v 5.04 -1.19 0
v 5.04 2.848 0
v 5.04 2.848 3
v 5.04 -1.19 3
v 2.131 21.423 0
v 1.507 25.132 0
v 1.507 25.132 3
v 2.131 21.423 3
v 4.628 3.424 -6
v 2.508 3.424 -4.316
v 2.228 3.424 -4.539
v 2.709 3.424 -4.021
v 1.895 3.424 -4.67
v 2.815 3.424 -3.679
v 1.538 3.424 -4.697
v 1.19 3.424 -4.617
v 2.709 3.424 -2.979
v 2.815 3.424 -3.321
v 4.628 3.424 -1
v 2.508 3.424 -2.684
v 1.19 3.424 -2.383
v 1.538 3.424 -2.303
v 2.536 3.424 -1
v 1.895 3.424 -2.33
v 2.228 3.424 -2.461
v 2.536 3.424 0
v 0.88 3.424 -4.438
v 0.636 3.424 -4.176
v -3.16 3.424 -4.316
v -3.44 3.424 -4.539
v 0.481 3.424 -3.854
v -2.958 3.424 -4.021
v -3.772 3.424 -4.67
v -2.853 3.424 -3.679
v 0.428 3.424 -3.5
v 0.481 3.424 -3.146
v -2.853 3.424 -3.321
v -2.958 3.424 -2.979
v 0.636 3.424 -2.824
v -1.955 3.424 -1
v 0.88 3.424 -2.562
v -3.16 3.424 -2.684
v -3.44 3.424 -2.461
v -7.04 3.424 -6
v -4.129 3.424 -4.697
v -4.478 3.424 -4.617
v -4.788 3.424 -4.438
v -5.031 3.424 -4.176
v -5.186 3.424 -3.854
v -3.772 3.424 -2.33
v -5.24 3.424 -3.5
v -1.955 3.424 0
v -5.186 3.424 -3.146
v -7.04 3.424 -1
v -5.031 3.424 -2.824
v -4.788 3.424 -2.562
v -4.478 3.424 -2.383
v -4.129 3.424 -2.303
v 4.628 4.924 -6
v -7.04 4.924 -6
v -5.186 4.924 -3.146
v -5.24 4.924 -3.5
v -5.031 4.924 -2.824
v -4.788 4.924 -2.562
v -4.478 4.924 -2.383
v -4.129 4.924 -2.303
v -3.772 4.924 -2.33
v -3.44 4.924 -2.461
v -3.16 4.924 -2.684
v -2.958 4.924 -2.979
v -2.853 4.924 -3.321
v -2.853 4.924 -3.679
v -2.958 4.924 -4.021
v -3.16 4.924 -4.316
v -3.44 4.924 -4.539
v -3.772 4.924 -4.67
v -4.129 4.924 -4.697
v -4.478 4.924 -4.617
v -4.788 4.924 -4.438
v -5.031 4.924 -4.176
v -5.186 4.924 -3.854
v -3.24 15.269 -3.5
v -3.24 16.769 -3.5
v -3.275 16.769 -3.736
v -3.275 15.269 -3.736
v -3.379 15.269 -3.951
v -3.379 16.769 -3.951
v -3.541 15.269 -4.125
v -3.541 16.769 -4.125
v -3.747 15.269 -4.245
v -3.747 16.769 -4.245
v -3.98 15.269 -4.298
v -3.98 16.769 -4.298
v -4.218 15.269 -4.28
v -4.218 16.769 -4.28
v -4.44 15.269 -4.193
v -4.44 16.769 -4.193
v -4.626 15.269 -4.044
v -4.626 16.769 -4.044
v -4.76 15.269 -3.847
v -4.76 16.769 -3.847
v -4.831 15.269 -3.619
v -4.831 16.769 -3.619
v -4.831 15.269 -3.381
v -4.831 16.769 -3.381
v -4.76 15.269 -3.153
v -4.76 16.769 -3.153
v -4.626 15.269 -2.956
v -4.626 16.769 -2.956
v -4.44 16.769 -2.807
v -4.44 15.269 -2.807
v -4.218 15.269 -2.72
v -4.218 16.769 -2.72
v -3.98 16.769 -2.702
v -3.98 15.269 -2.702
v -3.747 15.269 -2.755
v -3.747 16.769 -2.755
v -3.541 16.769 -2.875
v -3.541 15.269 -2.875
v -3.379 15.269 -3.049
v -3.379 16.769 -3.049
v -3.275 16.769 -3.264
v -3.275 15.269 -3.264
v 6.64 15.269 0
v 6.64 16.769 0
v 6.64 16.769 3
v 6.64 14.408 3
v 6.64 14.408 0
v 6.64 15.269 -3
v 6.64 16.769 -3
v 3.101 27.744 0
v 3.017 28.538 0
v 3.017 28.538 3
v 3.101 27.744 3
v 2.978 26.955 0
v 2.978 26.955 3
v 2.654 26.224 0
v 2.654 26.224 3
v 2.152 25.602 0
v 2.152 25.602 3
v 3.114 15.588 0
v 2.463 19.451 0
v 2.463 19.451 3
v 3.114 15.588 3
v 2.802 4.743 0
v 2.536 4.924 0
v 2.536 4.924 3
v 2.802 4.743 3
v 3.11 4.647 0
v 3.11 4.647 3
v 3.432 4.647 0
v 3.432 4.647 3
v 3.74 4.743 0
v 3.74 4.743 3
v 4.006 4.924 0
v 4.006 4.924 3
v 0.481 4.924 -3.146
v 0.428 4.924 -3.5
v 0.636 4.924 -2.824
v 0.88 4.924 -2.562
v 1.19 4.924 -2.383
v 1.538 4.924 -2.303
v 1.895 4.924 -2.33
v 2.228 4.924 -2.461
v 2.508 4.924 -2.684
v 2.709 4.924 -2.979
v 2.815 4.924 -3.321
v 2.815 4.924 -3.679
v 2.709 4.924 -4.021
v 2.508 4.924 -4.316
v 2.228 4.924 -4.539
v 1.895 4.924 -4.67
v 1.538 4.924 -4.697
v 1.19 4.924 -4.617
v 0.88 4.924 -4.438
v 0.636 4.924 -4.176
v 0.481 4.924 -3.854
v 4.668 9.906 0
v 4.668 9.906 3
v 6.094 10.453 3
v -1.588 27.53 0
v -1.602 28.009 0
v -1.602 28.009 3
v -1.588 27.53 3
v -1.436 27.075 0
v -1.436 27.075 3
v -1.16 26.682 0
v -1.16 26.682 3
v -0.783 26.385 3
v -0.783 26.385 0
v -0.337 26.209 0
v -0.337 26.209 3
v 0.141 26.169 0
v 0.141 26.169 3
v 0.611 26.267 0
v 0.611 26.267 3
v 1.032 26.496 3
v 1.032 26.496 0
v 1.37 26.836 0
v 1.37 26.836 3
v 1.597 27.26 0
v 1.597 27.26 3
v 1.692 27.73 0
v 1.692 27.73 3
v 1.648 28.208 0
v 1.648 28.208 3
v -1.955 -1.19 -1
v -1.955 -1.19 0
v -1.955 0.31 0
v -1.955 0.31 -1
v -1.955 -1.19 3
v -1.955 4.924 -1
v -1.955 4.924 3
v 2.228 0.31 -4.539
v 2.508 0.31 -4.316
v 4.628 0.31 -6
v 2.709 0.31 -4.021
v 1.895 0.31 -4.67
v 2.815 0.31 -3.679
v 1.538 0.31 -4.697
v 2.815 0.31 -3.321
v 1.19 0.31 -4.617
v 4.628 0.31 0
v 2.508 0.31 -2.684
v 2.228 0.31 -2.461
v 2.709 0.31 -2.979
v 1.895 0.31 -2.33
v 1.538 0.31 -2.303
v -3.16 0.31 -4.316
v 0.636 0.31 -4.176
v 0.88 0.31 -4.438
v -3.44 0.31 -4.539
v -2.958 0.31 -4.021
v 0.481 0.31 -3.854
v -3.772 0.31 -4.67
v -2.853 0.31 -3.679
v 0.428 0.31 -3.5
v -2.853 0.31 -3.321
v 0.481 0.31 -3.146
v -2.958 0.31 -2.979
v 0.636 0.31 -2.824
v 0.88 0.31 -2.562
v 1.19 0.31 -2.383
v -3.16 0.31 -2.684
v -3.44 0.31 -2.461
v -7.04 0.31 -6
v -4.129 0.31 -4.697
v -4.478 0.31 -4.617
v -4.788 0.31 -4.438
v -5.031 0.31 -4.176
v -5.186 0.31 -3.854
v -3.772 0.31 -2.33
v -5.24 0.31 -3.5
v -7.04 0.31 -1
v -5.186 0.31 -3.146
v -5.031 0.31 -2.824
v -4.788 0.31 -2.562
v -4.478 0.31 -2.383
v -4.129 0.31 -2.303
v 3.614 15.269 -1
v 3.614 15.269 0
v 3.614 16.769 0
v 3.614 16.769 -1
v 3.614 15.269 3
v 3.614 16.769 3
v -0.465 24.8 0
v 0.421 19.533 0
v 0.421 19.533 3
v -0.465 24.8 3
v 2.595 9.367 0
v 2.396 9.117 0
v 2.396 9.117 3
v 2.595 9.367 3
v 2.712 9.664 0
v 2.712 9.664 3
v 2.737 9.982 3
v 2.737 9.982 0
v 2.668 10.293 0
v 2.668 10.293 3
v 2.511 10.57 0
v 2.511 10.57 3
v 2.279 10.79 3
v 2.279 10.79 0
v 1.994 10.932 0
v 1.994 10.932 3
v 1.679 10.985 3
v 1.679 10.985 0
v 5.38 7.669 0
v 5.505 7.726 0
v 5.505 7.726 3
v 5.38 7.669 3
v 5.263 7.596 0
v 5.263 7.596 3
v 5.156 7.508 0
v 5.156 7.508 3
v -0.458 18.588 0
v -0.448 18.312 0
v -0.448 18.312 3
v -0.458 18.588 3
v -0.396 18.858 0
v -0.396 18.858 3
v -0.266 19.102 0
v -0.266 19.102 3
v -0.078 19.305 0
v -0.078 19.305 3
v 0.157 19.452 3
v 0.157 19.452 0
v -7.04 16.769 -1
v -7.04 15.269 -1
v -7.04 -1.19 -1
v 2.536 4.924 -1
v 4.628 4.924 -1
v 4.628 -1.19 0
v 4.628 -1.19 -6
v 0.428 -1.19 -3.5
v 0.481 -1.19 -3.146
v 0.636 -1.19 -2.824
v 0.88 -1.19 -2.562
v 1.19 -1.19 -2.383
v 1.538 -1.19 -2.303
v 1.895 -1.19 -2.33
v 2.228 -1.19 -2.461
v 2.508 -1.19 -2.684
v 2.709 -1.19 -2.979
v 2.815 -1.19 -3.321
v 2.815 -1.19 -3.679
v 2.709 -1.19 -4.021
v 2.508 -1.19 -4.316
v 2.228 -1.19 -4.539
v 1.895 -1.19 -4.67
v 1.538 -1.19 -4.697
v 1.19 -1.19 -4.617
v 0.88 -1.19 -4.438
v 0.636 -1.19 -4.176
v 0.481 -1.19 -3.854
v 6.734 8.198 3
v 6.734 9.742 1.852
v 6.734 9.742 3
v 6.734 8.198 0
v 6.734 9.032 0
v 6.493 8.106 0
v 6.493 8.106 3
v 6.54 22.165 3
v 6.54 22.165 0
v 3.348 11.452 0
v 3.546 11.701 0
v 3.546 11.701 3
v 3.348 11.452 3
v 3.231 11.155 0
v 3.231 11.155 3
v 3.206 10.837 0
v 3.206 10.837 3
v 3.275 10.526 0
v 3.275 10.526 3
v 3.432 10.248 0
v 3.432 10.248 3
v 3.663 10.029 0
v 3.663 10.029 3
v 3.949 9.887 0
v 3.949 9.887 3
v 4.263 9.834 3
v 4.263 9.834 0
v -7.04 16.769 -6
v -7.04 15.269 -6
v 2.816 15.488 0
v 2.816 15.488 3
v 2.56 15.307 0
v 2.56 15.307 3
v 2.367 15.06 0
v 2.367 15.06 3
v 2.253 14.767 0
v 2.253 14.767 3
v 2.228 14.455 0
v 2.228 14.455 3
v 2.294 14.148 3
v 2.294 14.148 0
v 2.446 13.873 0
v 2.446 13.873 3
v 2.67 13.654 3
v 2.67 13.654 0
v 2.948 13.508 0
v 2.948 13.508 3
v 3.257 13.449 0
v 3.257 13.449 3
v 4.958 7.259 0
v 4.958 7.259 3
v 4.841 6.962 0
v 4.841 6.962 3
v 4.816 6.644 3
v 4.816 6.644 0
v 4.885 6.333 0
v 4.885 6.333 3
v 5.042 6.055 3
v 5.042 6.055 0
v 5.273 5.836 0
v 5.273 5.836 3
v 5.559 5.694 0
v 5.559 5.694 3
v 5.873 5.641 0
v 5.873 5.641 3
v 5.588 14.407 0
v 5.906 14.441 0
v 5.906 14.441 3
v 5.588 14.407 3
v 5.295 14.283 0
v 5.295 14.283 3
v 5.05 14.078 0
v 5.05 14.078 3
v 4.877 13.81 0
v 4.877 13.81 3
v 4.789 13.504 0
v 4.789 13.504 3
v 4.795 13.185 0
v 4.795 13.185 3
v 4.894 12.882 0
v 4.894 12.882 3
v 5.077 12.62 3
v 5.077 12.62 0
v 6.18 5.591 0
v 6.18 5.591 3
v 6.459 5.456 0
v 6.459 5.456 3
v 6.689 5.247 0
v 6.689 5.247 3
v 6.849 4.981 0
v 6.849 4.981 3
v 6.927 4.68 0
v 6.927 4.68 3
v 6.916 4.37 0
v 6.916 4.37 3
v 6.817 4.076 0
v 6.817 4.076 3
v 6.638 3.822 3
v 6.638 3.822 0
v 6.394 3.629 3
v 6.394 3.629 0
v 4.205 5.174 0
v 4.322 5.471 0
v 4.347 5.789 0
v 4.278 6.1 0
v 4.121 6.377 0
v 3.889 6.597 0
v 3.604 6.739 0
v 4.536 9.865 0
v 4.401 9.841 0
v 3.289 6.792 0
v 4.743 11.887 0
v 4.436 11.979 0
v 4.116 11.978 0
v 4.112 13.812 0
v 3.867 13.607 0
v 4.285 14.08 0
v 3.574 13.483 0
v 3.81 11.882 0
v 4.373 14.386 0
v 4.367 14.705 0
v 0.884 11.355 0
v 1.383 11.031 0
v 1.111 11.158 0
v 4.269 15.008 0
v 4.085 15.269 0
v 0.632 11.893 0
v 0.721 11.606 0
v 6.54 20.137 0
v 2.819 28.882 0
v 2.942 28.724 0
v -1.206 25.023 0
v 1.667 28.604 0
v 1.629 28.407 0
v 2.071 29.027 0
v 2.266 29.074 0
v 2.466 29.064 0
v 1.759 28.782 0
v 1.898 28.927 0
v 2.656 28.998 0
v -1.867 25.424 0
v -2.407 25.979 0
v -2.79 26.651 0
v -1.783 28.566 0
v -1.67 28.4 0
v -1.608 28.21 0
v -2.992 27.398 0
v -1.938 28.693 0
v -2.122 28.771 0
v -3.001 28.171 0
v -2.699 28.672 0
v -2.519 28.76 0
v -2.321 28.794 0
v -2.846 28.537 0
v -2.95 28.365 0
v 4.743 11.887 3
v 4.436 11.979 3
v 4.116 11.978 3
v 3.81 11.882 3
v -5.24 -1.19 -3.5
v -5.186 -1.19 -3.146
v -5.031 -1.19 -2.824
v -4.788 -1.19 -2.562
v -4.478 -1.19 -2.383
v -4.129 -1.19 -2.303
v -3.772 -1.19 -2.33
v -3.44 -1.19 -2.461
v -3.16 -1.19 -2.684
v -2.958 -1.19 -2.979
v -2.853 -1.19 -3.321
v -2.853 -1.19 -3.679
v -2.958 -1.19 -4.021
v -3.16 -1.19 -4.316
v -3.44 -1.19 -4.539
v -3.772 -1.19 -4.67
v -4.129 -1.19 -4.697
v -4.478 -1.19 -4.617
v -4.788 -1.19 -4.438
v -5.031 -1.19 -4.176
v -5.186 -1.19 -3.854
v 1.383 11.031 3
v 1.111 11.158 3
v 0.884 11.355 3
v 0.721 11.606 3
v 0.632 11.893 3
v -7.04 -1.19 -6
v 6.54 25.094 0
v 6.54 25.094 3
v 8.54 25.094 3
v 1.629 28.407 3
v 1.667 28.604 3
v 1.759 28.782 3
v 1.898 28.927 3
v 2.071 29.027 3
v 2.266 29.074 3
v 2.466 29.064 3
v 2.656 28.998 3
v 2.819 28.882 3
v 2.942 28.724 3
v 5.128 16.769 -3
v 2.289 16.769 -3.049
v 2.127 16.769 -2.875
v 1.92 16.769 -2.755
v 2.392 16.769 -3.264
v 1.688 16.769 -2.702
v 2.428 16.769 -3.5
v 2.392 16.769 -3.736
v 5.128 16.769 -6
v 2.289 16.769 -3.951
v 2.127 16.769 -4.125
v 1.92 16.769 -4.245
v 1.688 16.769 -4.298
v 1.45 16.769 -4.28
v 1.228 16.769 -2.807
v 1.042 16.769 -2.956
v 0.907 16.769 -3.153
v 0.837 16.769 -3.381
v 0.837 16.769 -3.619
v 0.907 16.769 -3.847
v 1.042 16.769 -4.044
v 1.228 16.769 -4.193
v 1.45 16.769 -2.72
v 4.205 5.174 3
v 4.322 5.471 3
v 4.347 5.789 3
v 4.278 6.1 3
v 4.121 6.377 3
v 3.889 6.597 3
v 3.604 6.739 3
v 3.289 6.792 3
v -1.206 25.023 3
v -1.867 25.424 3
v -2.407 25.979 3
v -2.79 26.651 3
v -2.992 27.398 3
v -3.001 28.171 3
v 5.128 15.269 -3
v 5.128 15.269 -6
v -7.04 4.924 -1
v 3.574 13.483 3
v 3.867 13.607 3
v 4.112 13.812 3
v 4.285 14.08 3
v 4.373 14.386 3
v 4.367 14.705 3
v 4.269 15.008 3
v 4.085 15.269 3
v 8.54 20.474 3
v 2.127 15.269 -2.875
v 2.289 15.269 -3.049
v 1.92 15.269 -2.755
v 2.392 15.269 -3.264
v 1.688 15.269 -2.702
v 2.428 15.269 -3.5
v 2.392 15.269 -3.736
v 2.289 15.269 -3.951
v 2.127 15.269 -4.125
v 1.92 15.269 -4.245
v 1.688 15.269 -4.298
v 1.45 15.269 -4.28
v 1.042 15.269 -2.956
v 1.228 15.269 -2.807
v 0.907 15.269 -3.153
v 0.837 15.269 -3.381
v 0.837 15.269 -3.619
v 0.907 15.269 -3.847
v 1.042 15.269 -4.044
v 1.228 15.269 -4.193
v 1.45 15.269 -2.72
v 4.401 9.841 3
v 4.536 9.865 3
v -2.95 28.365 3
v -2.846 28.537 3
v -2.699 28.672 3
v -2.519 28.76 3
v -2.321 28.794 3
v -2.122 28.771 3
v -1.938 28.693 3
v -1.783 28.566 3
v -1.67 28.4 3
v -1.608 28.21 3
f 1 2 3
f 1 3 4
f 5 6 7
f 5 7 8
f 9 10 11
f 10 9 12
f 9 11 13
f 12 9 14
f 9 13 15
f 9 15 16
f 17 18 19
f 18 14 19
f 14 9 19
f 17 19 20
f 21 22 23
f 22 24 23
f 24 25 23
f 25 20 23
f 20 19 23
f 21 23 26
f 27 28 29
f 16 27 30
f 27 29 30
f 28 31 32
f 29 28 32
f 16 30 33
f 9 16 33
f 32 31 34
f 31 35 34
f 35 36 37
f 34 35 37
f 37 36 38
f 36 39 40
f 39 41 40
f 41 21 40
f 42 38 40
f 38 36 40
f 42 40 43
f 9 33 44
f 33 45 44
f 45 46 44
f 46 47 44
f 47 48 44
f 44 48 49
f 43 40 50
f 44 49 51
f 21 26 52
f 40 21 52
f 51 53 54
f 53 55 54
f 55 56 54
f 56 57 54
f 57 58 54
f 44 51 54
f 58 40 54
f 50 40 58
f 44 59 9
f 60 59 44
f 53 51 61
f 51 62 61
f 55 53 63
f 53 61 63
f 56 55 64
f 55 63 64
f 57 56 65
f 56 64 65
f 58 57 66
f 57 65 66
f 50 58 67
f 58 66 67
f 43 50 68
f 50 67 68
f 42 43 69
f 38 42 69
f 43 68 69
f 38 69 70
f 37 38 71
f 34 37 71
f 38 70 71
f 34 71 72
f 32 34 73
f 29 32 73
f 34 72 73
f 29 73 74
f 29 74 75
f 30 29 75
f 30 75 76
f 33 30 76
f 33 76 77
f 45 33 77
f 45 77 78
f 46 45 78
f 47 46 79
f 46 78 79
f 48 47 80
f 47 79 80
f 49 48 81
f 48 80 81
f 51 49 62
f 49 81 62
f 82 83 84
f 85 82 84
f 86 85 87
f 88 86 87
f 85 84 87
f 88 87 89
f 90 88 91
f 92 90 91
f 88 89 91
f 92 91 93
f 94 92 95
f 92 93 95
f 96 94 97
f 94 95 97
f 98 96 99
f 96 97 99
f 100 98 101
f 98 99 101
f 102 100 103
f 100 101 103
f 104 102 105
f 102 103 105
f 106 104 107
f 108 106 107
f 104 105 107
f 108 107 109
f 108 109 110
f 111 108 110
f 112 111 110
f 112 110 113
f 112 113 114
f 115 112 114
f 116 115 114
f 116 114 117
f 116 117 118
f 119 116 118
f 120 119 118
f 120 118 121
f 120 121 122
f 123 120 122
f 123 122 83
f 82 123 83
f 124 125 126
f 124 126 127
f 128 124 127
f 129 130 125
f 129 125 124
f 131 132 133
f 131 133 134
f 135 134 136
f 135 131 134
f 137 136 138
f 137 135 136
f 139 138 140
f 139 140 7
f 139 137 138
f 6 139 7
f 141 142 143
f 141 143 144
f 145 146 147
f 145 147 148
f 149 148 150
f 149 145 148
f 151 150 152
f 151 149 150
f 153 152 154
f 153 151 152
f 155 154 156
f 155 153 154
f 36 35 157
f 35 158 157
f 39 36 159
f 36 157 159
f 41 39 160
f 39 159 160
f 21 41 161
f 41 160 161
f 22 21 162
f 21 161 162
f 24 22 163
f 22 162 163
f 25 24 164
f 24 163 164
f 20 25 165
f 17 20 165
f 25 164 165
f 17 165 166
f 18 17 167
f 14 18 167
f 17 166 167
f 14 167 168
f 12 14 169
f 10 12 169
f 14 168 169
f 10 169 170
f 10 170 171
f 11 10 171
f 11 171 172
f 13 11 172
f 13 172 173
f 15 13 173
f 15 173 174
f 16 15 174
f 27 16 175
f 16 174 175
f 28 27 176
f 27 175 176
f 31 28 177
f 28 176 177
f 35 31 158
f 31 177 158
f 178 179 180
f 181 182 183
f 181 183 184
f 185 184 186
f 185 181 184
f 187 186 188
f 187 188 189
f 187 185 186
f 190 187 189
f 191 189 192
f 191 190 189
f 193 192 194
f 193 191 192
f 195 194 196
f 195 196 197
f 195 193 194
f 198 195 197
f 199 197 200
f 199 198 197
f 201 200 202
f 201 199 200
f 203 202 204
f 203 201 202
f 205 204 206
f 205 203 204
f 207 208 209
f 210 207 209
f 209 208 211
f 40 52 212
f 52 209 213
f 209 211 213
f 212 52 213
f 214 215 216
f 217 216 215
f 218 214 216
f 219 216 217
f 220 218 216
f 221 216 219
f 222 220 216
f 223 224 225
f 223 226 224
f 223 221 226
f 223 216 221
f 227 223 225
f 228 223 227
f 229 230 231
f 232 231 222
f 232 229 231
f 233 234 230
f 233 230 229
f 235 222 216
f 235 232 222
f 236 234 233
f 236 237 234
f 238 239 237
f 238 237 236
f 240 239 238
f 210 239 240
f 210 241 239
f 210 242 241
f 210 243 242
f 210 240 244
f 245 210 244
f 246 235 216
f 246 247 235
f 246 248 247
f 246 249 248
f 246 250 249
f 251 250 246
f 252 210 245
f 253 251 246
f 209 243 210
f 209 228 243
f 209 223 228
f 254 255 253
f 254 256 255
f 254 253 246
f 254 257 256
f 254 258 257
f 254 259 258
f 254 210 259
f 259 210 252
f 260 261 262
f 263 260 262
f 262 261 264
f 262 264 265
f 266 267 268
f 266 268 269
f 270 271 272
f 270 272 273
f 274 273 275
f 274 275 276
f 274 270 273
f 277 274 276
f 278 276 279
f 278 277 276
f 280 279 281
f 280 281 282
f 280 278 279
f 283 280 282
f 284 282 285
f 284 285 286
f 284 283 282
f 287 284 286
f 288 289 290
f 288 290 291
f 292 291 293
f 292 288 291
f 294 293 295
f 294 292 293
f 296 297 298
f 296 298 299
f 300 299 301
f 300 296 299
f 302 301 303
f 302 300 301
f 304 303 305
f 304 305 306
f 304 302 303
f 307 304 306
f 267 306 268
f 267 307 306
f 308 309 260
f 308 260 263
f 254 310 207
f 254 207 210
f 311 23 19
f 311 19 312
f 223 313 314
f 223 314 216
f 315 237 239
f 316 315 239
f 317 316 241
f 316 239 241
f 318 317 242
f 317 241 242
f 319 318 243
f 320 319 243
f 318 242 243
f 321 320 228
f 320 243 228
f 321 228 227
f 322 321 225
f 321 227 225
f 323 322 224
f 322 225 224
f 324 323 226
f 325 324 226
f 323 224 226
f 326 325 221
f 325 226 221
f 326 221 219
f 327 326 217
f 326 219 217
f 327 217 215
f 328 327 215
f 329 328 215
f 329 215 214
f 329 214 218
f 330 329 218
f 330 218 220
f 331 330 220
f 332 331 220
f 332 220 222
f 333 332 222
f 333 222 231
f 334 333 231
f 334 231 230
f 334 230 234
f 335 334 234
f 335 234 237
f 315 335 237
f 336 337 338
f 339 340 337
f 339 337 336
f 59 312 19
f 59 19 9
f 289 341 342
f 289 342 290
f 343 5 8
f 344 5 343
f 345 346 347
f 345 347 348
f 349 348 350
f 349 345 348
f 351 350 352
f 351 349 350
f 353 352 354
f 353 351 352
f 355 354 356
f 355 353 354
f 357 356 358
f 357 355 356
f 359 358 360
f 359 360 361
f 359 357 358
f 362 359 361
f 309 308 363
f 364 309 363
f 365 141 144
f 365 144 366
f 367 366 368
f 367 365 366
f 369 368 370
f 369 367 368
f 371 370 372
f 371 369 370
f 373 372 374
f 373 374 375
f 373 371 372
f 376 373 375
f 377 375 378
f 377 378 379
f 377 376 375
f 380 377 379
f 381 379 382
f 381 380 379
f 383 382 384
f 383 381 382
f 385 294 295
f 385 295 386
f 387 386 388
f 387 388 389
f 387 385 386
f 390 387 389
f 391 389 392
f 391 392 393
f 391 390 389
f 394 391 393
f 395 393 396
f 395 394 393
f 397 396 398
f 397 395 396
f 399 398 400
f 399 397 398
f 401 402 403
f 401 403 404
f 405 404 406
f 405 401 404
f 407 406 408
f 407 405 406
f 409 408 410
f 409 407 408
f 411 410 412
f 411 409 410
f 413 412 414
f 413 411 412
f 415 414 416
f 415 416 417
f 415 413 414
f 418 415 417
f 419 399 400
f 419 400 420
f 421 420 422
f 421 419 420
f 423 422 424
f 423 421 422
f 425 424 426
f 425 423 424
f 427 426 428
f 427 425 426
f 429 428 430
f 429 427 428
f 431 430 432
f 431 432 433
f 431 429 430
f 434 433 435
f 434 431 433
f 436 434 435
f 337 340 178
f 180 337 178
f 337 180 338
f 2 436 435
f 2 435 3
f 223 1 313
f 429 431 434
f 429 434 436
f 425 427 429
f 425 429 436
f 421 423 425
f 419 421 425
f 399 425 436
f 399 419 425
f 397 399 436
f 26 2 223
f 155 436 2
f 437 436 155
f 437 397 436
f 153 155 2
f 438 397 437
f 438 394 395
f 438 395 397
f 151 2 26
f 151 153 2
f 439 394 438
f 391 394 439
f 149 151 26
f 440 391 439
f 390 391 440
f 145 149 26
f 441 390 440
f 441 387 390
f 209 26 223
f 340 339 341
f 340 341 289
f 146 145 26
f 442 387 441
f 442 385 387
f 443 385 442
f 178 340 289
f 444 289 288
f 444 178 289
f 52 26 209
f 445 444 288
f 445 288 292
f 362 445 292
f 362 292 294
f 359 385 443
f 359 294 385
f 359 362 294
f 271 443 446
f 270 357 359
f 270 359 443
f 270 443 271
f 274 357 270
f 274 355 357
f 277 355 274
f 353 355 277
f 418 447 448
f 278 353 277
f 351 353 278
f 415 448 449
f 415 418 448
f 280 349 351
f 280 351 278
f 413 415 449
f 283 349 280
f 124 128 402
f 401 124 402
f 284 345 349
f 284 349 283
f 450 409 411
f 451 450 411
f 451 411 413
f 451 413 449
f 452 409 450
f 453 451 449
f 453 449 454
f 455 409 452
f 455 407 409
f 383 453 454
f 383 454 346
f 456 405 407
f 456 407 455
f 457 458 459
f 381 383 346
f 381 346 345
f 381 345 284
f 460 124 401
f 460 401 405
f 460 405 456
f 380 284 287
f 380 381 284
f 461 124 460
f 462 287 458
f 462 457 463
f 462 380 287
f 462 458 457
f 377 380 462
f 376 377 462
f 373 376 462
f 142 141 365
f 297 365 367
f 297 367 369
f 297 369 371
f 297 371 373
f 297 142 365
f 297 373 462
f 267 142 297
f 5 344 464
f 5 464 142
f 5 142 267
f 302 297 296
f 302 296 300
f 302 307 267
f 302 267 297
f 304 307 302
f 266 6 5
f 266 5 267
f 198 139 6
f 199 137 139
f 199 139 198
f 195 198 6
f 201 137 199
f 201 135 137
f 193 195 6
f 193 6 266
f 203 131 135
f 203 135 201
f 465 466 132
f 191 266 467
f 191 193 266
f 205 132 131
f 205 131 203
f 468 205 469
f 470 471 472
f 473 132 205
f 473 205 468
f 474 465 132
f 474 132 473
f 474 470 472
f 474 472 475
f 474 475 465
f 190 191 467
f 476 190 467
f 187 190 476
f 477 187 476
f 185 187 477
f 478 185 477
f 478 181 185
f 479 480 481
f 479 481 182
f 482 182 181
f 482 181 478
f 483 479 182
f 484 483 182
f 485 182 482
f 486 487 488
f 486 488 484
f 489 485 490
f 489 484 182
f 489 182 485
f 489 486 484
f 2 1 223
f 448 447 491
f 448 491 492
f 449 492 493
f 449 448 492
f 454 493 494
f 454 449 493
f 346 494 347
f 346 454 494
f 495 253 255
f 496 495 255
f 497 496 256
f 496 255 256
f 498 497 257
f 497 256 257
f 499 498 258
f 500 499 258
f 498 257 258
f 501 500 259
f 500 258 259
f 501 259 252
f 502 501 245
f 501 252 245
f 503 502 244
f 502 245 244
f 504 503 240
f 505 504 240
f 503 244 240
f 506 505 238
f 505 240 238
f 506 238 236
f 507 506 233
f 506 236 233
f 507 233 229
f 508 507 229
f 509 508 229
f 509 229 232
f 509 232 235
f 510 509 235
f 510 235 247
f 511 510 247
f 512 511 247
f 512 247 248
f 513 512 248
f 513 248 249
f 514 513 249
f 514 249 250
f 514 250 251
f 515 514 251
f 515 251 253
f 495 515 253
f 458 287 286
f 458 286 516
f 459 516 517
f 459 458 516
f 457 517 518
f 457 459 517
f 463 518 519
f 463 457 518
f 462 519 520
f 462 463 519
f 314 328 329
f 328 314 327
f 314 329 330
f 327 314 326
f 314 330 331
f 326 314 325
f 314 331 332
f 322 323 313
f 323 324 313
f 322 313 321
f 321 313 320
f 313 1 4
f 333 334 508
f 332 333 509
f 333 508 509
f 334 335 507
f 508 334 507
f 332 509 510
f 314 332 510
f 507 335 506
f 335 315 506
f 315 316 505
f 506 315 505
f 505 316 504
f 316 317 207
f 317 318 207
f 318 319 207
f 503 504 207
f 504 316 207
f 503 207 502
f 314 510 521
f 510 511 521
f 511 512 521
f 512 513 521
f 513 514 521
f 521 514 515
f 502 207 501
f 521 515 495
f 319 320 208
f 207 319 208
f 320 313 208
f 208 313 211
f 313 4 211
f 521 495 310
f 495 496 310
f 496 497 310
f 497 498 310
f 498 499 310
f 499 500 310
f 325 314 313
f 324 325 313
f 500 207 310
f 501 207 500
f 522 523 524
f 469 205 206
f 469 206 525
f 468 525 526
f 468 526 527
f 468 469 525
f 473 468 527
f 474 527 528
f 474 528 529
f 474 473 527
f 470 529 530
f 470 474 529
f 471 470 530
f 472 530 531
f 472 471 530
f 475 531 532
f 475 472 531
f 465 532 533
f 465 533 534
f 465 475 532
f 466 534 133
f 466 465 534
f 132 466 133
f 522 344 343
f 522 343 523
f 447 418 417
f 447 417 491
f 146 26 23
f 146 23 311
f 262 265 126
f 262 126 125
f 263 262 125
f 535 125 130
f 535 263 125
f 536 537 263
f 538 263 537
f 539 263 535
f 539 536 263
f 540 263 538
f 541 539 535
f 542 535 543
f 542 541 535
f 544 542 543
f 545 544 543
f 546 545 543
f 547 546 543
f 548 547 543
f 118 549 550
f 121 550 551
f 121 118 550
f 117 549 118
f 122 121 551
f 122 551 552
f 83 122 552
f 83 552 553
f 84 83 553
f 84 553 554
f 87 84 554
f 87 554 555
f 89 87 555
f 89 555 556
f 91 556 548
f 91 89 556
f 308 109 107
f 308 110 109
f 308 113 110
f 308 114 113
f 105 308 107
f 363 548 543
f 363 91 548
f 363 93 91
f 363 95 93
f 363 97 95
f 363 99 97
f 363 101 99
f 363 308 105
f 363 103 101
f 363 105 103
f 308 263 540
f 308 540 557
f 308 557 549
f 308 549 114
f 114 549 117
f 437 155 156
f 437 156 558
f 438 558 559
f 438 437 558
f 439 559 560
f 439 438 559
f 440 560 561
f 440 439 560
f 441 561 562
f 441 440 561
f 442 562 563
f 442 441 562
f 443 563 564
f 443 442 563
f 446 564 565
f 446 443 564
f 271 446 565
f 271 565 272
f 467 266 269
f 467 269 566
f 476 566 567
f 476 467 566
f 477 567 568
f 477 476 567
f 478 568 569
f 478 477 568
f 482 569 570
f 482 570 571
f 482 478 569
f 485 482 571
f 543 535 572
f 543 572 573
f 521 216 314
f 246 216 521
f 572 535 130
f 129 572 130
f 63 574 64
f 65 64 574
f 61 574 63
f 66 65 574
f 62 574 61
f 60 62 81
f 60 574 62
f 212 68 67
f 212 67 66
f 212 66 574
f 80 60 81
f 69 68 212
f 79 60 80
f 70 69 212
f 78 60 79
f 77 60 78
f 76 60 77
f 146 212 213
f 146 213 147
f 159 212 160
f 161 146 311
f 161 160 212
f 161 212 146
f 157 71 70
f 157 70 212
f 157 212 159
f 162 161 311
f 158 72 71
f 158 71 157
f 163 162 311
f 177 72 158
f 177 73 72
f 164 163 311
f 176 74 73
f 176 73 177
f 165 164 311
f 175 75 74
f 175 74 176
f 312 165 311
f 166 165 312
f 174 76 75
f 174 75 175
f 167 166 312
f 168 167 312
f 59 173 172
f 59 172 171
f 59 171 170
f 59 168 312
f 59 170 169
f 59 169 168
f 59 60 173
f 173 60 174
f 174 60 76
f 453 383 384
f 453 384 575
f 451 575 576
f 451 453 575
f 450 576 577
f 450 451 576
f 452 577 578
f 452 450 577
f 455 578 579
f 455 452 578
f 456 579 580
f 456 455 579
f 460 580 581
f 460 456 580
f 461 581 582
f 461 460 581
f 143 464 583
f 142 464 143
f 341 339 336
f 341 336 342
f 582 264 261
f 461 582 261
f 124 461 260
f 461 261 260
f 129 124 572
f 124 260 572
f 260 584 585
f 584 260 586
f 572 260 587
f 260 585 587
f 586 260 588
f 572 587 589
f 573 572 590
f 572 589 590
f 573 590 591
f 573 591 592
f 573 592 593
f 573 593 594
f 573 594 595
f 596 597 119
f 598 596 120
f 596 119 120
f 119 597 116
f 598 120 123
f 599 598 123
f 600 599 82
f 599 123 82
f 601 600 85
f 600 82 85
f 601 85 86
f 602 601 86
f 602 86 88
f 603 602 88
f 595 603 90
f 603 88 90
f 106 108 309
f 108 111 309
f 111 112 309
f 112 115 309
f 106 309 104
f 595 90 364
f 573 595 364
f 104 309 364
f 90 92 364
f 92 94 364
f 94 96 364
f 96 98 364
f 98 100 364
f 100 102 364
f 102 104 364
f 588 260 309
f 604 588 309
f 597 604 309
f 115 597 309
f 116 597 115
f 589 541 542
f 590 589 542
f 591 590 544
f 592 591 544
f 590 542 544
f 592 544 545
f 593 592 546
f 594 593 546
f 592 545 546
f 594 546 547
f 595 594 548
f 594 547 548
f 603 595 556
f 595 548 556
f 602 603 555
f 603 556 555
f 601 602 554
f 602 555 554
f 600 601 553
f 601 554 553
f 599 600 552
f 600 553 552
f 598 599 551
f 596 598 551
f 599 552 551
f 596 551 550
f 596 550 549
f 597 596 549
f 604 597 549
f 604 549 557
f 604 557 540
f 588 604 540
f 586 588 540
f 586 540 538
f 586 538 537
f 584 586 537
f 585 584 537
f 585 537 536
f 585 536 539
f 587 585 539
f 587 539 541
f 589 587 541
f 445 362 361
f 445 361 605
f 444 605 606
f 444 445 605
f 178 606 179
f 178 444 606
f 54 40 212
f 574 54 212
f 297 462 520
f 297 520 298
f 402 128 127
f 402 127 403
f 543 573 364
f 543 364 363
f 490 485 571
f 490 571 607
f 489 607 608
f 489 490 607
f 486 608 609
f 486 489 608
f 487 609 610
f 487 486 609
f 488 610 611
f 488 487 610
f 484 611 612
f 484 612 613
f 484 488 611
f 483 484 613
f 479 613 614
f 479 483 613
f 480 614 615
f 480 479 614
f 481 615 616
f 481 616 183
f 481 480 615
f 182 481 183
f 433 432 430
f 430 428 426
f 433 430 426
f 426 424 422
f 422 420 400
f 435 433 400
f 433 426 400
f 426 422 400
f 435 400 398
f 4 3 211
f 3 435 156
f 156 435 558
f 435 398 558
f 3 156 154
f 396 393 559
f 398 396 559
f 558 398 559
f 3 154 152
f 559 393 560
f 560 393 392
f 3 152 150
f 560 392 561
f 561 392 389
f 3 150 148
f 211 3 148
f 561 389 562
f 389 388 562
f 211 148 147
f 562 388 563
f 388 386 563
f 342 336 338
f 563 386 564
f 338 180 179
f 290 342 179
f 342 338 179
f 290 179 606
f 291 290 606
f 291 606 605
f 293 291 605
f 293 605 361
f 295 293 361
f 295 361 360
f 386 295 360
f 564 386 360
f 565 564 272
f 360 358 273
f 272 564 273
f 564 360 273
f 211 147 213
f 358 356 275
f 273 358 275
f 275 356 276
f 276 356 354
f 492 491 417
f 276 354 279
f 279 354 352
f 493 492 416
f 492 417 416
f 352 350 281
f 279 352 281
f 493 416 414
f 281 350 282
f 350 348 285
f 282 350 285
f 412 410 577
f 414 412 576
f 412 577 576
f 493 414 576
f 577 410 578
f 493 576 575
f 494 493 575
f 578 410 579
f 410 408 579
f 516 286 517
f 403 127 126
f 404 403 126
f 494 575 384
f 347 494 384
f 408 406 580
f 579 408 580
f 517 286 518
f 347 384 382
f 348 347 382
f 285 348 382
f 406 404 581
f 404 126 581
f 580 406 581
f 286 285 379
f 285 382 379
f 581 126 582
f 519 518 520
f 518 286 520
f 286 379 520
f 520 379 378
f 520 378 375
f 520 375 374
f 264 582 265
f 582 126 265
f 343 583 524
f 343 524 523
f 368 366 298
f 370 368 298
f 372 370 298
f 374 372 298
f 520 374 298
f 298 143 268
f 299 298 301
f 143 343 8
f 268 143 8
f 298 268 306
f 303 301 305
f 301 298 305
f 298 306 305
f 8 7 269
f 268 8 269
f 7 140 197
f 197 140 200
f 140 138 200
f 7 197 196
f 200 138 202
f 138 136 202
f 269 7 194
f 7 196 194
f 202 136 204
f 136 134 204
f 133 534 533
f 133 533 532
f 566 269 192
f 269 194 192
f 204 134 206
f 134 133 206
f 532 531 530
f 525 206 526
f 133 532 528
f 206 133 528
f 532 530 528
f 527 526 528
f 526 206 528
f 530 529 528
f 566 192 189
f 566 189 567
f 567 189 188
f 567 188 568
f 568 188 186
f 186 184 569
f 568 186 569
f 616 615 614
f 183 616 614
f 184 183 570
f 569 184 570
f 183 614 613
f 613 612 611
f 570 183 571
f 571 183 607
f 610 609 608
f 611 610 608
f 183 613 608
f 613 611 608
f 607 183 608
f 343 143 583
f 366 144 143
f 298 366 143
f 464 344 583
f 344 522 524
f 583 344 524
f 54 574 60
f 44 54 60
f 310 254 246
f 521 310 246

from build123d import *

# Parameters (mm, degrees)
BOSS_SWITCHMAIN_DEPTH           = 3
SKETCH1_W                       = 6.582729781
SKETCH1_H                       = 1.5
SKETCH1_W_2                     = 3.025930853
SKETCH1_W_3                     = 4.49100728
BOSS_FLANGE_WIDTH_DEPTH         = 6
SKETCH2_W                       = 5
SKETCH2_H                       = 1.5
BOSS_FLANGE_HEIGHT_DEPTH        = 11.6675
TAP_DRILL_FOR_M2X0_4_TAP1_D     = 1.6
M2_CLEARANCE_HOLE2_D            = 2.4
M2_CLEARANCE_HOLE2_DEPTH        = 6.113984988
M2_CLEARANCE_HOLE2_TIP          = 0.721032743
CUT_FLANGE_RAMP_CLEARANCE_REACH = 19.959
SKETCH10_W                      = 1.51157113
SKETCH10_H                      = 3
CUT_EXTRUDE1_REACH              = 28.283
CUT_EXTRUDE2_REACH              = 22.07


with BuildPart() as part:
    # Sketch-SwitchBossUp → Boss-SwitchMain (new body)
    with BuildSketch(Plane.XY):
        with BuildLine():
            Line((6.540476927, 22.165014537), (6.540476927, 25.093856925))
            Line((6.540476927, 25.093856925), (8.540476927, 25.093856925))
            Line((8.540476927, 25.093856925), (8.540476927, 20.473554675))
            Line((8.540476927, 20.473554675), (2.463355023, 19.450530066))
            Line((2.463355023, 19.450530066), (3.113617204, 15.587746603))
            ThreePointArc((3.113617204, 15.587746603), (2.228151344, 14.454516392), (3.25659329, 13.449246446))
            ThreePointArc((3.25659329, 13.449246446), (4.285298124, 14.079636296), (4.085366752, 15.269448233))
            Line((4.085366752, 15.269448233), (3.613617204, 15.269448233))
            Line((3.613617204, 15.269448233), (3.613617204, 16.769448233))
            Line((3.613617204, 16.769448233), (6.639548057, 16.769448233))
            Line((6.639548057, 16.769448233), (6.639548057, 14.40837951))
            Line((6.639548057, 14.40837951), (5.90556854, 14.440674771))
            ThreePointArc((5.90556854, 14.440674771), (4.876863705, 13.810284921), (5.076795077, 12.620472983))
            Line((5.076795077, 12.620472983), (4.742765687, 11.886857682))
            ThreePointArc((4.742765687, 11.886857682), (4.116092357, 11.977881728), (3.546393548, 11.701389219))
            ThreePointArc((3.546393548, 11.701389219), (3.274676841, 10.525891439), (4.263259905, 9.834278449))
            ThreePointArc((4.263259905, 9.834278449), (4.46894162, 9.850585257), (4.667751547, 9.905771245))
            Line((4.667751547, 9.905771245), (6.093996382, 10.453369682))
            Line((6.093996382, 10.453369682), (6.73413388, 9.742424966))
            Line((6.73413388, 9.742424966), (6.73413388, 8.198043394))
            Line((6.73413388, 8.198043394), (6.493366278, 8.105602069))
            Line((6.493366278, 8.105602069), (5.504663813, 7.725995489))
            ThreePointArc((5.504663813, 7.725995489), (5.320005472, 7.633951058), (5.156260325, 7.508418563))
            ThreePointArc((5.156260325, 7.508418563), (4.884543619, 6.332920783), (5.873126682, 5.641307794))
            ThreePointArc((5.873126682, 5.641307794), (6.898907846, 4.833576465), (6.394232666, 3.629433676))
            Line((6.394232666, 3.629433676), (5.040476927, 2.847842436))
            Line((5.040476927, 2.847842436), (5.040476927, -1.189543551))
            Line((5.040476927, -1.189543551), (-1.954752854, -1.189543551))
            Line((-1.954752854, -1.189543551), (-1.954752854, 4.924441437))
            Line((-1.954752854, 4.924441437), (2.536254426, 4.924441437))
            ThreePointArc((2.536254426, 4.924441437), (3.271135169, 4.635221221), (4.006015912, 4.924441437))
            ThreePointArc((4.006015912, 4.924441437), (4.277732619, 6.099939217), (3.289149555, 6.791552207))
            Line((3.289149555, 6.791552207), (2.396149135, 9.117412093))
            ThreePointArc((2.396149135, 9.117412093), (2.667865841, 10.292909873), (1.679282778, 10.984522862))
            ThreePointArc((1.679282778, 10.984522862), (0.990609652, 11.24824473), (0.632497087, 11.892896022))
            Line((0.632497087, 11.892896022), (-0.448028681, 18.3115948))
            ThreePointArc((-0.448028681, 18.3115948), (-0.266285833, 19.102309392), (0.421345416, 19.532917442))
            Line((0.421345416, 19.532917442), (-0.465233701, 24.799505683))
            ThreePointArc((-0.465233701, 24.799505683), (-2.406587703, 25.978955839), (-3.001107523, 28.171329943))
            ThreePointArc((-3.001107523, 28.171329943), (-2.220760115, 28.789797628), (-1.602292431, 28.009450221))
            ThreePointArc((-1.602292431, 28.009450221), (0.141134159, 26.168671513), (1.647974165, 28.207650602))
            ThreePointArc((1.647974165, 28.207650602), (2.167041147, 29.057364566), (3.016755111, 28.538297585))
            ThreePointArc((3.016755111, 28.538297585), (2.839798095, 26.578800421), (1.507016259, 25.131514861))
            Line((1.507016259, 25.131514861), (2.131345845, 21.422780026))
            Line((2.131345845, 21.422780026), (6.540476927, 22.165014537))
        make_face()
    extrude(amount=BOSS_SWITCHMAIN_DEPTH)

    # Sketch1 → Boss-Flange Width (add)
    with BuildSketch(Plane(origin=(0, 0, 0), x_dir=(-1, 0, 0), z_dir=(0, 0, -1))):
        with Locations((-1.336612037, -0.439543551)):
            Rectangle(SKETCH1_W, SKETCH1_H)
        with Locations((-5.126582631, 16.019448233)):
            Rectangle(SKETCH1_W_2, SKETCH1_H)
        with Locations((-0.290750786, 4.174441437)):
            Rectangle(SKETCH1_W_3, SKETCH1_H)
    extrude(amount=BOSS_FLANGE_WIDTH_DEPTH)

    # Sketch2 → Boss-Flange Height (add)
    with BuildSketch(Plane(origin=(-7.039523073, 0, 0), x_dir=(0, 0, -1), z_dir=(1, 0, 0))):
        with Locations((3.5, 16.019448233)):
            Rectangle(SKETCH2_W, SKETCH2_H)
        with Locations((3.5, 4.174441437)):
            Rectangle(SKETCH2_W, SKETCH2_H)
        with Locations((3.5, -0.439543551)):
            Rectangle(SKETCH2_W, SKETCH2_H)
    extrude(amount=BOSS_FLANGE_HEIGHT_DEPTH)

    # Tap Drill for M2x0.4 Tap1 (through all)
    with Locations(Plane(origin=(0, -1.189543551, 0), x_dir=(-1, 0, 0), z_dir=(0, -1, 0))):
        with Locations((4.039523073, 3.5), (-1.627976927, 3.5)):
            Hole(TAP_DRILL_FOR_M2X0_4_TAP1_D / 2)

    # M2 Clearance Hole2
    with Locations(Plane.XZ.offset(1.189543551)):
        with Locations((-4.039523073, -3.5), (1.627976927, -3.5)):
            Hole(M2_CLEARANCE_HOLE2_D / 2, depth=M2_CLEARANCE_HOLE2_DEPTH)
            with Locations((0, 0, -(M2_CLEARANCE_HOLE2_DEPTH + M2_CLEARANCE_HOLE2_TIP / 2))):  # 118° drill point
                Cone(0, M2_CLEARANCE_HOLE2_D / 2, M2_CLEARANCE_HOLE2_TIP, mode=Mode.SUBTRACT)

    # Sketch10 → Cut-Flange Ramp Clearance (cut, up to next)
    with BuildSketch(Plane(origin=(0, 16.769448233, 0), x_dir=(1, 0, 0), z_dir=(0, 1, 0)), mode=Mode.PRIVATE) as cut_flange_ramp_clearance_sk1:
        with Locations((5.883762492, 4.5)):
            Rectangle(SKETCH10_W, SKETCH10_H)
    cut_flange_ramp_clearance_tool1 = extrude(cut_flange_ramp_clearance_sk1.sketch, amount=-CUT_FLANGE_RAMP_CLEARANCE_REACH, mode=Mode.PRIVATE) & part.part
    add(cut_flange_ramp_clearance_tool1.solids().sort_by_distance((5.883762, 16.769448, -4.5))[0], mode=Mode.SUBTRACT)

    # Sketch12 → Cut-Extrude1 (cut, up to next)
    with BuildSketch(Plane(origin=(0, 25.093856925, 0), x_dir=(1, 0, 0), z_dir=(0, 1, 0)), mode=Mode.PRIVATE) as cut_extrude1_sk1:
        Polygon((6.540476927, 0), (8.540476927, -3), (8.540476927, 0), align=None)
    cut_extrude1_tool1 = extrude(cut_extrude1_sk1.sketch, amount=-CUT_EXTRUDE1_REACH, mode=Mode.PRIVATE) & part.part
    add(cut_extrude1_tool1.solids().sort_by_distance((7.87381, 25.093857, 1))[0], mode=Mode.SUBTRACT)

    # Sketch14 → Cut-Extrude2 (cut, up to next)
    with BuildSketch(Plane(origin=(3.789105765, 8.959047136, -3.436717579), x_dir=(-0.930109907, 0.342916579, -0.131543837), z_dir=(-0.367281311, -0.868408215, 0.333124018)), mode=Mode.PRIVATE) as cut_extrude2_sk1:
        Polygon((-0.94466877, -3.547806869), (-4.277307049, -3.078270724), (-4.824829049, -6.964431121), (-1.431952972, -6.964431121), align=None)
    cut_extrude2_tool1 = extrude(cut_extrude2_sk1.sketch, amount=-CUT_EXTRUDE2_REACH, mode=Mode.PRIVATE) & part.part
    add(cut_extrude2_tool1.solids().sort_by_distance((6.491643, 9.802029, 1.740466))[0], mode=Mode.SUBTRACT)


solid = part.part
